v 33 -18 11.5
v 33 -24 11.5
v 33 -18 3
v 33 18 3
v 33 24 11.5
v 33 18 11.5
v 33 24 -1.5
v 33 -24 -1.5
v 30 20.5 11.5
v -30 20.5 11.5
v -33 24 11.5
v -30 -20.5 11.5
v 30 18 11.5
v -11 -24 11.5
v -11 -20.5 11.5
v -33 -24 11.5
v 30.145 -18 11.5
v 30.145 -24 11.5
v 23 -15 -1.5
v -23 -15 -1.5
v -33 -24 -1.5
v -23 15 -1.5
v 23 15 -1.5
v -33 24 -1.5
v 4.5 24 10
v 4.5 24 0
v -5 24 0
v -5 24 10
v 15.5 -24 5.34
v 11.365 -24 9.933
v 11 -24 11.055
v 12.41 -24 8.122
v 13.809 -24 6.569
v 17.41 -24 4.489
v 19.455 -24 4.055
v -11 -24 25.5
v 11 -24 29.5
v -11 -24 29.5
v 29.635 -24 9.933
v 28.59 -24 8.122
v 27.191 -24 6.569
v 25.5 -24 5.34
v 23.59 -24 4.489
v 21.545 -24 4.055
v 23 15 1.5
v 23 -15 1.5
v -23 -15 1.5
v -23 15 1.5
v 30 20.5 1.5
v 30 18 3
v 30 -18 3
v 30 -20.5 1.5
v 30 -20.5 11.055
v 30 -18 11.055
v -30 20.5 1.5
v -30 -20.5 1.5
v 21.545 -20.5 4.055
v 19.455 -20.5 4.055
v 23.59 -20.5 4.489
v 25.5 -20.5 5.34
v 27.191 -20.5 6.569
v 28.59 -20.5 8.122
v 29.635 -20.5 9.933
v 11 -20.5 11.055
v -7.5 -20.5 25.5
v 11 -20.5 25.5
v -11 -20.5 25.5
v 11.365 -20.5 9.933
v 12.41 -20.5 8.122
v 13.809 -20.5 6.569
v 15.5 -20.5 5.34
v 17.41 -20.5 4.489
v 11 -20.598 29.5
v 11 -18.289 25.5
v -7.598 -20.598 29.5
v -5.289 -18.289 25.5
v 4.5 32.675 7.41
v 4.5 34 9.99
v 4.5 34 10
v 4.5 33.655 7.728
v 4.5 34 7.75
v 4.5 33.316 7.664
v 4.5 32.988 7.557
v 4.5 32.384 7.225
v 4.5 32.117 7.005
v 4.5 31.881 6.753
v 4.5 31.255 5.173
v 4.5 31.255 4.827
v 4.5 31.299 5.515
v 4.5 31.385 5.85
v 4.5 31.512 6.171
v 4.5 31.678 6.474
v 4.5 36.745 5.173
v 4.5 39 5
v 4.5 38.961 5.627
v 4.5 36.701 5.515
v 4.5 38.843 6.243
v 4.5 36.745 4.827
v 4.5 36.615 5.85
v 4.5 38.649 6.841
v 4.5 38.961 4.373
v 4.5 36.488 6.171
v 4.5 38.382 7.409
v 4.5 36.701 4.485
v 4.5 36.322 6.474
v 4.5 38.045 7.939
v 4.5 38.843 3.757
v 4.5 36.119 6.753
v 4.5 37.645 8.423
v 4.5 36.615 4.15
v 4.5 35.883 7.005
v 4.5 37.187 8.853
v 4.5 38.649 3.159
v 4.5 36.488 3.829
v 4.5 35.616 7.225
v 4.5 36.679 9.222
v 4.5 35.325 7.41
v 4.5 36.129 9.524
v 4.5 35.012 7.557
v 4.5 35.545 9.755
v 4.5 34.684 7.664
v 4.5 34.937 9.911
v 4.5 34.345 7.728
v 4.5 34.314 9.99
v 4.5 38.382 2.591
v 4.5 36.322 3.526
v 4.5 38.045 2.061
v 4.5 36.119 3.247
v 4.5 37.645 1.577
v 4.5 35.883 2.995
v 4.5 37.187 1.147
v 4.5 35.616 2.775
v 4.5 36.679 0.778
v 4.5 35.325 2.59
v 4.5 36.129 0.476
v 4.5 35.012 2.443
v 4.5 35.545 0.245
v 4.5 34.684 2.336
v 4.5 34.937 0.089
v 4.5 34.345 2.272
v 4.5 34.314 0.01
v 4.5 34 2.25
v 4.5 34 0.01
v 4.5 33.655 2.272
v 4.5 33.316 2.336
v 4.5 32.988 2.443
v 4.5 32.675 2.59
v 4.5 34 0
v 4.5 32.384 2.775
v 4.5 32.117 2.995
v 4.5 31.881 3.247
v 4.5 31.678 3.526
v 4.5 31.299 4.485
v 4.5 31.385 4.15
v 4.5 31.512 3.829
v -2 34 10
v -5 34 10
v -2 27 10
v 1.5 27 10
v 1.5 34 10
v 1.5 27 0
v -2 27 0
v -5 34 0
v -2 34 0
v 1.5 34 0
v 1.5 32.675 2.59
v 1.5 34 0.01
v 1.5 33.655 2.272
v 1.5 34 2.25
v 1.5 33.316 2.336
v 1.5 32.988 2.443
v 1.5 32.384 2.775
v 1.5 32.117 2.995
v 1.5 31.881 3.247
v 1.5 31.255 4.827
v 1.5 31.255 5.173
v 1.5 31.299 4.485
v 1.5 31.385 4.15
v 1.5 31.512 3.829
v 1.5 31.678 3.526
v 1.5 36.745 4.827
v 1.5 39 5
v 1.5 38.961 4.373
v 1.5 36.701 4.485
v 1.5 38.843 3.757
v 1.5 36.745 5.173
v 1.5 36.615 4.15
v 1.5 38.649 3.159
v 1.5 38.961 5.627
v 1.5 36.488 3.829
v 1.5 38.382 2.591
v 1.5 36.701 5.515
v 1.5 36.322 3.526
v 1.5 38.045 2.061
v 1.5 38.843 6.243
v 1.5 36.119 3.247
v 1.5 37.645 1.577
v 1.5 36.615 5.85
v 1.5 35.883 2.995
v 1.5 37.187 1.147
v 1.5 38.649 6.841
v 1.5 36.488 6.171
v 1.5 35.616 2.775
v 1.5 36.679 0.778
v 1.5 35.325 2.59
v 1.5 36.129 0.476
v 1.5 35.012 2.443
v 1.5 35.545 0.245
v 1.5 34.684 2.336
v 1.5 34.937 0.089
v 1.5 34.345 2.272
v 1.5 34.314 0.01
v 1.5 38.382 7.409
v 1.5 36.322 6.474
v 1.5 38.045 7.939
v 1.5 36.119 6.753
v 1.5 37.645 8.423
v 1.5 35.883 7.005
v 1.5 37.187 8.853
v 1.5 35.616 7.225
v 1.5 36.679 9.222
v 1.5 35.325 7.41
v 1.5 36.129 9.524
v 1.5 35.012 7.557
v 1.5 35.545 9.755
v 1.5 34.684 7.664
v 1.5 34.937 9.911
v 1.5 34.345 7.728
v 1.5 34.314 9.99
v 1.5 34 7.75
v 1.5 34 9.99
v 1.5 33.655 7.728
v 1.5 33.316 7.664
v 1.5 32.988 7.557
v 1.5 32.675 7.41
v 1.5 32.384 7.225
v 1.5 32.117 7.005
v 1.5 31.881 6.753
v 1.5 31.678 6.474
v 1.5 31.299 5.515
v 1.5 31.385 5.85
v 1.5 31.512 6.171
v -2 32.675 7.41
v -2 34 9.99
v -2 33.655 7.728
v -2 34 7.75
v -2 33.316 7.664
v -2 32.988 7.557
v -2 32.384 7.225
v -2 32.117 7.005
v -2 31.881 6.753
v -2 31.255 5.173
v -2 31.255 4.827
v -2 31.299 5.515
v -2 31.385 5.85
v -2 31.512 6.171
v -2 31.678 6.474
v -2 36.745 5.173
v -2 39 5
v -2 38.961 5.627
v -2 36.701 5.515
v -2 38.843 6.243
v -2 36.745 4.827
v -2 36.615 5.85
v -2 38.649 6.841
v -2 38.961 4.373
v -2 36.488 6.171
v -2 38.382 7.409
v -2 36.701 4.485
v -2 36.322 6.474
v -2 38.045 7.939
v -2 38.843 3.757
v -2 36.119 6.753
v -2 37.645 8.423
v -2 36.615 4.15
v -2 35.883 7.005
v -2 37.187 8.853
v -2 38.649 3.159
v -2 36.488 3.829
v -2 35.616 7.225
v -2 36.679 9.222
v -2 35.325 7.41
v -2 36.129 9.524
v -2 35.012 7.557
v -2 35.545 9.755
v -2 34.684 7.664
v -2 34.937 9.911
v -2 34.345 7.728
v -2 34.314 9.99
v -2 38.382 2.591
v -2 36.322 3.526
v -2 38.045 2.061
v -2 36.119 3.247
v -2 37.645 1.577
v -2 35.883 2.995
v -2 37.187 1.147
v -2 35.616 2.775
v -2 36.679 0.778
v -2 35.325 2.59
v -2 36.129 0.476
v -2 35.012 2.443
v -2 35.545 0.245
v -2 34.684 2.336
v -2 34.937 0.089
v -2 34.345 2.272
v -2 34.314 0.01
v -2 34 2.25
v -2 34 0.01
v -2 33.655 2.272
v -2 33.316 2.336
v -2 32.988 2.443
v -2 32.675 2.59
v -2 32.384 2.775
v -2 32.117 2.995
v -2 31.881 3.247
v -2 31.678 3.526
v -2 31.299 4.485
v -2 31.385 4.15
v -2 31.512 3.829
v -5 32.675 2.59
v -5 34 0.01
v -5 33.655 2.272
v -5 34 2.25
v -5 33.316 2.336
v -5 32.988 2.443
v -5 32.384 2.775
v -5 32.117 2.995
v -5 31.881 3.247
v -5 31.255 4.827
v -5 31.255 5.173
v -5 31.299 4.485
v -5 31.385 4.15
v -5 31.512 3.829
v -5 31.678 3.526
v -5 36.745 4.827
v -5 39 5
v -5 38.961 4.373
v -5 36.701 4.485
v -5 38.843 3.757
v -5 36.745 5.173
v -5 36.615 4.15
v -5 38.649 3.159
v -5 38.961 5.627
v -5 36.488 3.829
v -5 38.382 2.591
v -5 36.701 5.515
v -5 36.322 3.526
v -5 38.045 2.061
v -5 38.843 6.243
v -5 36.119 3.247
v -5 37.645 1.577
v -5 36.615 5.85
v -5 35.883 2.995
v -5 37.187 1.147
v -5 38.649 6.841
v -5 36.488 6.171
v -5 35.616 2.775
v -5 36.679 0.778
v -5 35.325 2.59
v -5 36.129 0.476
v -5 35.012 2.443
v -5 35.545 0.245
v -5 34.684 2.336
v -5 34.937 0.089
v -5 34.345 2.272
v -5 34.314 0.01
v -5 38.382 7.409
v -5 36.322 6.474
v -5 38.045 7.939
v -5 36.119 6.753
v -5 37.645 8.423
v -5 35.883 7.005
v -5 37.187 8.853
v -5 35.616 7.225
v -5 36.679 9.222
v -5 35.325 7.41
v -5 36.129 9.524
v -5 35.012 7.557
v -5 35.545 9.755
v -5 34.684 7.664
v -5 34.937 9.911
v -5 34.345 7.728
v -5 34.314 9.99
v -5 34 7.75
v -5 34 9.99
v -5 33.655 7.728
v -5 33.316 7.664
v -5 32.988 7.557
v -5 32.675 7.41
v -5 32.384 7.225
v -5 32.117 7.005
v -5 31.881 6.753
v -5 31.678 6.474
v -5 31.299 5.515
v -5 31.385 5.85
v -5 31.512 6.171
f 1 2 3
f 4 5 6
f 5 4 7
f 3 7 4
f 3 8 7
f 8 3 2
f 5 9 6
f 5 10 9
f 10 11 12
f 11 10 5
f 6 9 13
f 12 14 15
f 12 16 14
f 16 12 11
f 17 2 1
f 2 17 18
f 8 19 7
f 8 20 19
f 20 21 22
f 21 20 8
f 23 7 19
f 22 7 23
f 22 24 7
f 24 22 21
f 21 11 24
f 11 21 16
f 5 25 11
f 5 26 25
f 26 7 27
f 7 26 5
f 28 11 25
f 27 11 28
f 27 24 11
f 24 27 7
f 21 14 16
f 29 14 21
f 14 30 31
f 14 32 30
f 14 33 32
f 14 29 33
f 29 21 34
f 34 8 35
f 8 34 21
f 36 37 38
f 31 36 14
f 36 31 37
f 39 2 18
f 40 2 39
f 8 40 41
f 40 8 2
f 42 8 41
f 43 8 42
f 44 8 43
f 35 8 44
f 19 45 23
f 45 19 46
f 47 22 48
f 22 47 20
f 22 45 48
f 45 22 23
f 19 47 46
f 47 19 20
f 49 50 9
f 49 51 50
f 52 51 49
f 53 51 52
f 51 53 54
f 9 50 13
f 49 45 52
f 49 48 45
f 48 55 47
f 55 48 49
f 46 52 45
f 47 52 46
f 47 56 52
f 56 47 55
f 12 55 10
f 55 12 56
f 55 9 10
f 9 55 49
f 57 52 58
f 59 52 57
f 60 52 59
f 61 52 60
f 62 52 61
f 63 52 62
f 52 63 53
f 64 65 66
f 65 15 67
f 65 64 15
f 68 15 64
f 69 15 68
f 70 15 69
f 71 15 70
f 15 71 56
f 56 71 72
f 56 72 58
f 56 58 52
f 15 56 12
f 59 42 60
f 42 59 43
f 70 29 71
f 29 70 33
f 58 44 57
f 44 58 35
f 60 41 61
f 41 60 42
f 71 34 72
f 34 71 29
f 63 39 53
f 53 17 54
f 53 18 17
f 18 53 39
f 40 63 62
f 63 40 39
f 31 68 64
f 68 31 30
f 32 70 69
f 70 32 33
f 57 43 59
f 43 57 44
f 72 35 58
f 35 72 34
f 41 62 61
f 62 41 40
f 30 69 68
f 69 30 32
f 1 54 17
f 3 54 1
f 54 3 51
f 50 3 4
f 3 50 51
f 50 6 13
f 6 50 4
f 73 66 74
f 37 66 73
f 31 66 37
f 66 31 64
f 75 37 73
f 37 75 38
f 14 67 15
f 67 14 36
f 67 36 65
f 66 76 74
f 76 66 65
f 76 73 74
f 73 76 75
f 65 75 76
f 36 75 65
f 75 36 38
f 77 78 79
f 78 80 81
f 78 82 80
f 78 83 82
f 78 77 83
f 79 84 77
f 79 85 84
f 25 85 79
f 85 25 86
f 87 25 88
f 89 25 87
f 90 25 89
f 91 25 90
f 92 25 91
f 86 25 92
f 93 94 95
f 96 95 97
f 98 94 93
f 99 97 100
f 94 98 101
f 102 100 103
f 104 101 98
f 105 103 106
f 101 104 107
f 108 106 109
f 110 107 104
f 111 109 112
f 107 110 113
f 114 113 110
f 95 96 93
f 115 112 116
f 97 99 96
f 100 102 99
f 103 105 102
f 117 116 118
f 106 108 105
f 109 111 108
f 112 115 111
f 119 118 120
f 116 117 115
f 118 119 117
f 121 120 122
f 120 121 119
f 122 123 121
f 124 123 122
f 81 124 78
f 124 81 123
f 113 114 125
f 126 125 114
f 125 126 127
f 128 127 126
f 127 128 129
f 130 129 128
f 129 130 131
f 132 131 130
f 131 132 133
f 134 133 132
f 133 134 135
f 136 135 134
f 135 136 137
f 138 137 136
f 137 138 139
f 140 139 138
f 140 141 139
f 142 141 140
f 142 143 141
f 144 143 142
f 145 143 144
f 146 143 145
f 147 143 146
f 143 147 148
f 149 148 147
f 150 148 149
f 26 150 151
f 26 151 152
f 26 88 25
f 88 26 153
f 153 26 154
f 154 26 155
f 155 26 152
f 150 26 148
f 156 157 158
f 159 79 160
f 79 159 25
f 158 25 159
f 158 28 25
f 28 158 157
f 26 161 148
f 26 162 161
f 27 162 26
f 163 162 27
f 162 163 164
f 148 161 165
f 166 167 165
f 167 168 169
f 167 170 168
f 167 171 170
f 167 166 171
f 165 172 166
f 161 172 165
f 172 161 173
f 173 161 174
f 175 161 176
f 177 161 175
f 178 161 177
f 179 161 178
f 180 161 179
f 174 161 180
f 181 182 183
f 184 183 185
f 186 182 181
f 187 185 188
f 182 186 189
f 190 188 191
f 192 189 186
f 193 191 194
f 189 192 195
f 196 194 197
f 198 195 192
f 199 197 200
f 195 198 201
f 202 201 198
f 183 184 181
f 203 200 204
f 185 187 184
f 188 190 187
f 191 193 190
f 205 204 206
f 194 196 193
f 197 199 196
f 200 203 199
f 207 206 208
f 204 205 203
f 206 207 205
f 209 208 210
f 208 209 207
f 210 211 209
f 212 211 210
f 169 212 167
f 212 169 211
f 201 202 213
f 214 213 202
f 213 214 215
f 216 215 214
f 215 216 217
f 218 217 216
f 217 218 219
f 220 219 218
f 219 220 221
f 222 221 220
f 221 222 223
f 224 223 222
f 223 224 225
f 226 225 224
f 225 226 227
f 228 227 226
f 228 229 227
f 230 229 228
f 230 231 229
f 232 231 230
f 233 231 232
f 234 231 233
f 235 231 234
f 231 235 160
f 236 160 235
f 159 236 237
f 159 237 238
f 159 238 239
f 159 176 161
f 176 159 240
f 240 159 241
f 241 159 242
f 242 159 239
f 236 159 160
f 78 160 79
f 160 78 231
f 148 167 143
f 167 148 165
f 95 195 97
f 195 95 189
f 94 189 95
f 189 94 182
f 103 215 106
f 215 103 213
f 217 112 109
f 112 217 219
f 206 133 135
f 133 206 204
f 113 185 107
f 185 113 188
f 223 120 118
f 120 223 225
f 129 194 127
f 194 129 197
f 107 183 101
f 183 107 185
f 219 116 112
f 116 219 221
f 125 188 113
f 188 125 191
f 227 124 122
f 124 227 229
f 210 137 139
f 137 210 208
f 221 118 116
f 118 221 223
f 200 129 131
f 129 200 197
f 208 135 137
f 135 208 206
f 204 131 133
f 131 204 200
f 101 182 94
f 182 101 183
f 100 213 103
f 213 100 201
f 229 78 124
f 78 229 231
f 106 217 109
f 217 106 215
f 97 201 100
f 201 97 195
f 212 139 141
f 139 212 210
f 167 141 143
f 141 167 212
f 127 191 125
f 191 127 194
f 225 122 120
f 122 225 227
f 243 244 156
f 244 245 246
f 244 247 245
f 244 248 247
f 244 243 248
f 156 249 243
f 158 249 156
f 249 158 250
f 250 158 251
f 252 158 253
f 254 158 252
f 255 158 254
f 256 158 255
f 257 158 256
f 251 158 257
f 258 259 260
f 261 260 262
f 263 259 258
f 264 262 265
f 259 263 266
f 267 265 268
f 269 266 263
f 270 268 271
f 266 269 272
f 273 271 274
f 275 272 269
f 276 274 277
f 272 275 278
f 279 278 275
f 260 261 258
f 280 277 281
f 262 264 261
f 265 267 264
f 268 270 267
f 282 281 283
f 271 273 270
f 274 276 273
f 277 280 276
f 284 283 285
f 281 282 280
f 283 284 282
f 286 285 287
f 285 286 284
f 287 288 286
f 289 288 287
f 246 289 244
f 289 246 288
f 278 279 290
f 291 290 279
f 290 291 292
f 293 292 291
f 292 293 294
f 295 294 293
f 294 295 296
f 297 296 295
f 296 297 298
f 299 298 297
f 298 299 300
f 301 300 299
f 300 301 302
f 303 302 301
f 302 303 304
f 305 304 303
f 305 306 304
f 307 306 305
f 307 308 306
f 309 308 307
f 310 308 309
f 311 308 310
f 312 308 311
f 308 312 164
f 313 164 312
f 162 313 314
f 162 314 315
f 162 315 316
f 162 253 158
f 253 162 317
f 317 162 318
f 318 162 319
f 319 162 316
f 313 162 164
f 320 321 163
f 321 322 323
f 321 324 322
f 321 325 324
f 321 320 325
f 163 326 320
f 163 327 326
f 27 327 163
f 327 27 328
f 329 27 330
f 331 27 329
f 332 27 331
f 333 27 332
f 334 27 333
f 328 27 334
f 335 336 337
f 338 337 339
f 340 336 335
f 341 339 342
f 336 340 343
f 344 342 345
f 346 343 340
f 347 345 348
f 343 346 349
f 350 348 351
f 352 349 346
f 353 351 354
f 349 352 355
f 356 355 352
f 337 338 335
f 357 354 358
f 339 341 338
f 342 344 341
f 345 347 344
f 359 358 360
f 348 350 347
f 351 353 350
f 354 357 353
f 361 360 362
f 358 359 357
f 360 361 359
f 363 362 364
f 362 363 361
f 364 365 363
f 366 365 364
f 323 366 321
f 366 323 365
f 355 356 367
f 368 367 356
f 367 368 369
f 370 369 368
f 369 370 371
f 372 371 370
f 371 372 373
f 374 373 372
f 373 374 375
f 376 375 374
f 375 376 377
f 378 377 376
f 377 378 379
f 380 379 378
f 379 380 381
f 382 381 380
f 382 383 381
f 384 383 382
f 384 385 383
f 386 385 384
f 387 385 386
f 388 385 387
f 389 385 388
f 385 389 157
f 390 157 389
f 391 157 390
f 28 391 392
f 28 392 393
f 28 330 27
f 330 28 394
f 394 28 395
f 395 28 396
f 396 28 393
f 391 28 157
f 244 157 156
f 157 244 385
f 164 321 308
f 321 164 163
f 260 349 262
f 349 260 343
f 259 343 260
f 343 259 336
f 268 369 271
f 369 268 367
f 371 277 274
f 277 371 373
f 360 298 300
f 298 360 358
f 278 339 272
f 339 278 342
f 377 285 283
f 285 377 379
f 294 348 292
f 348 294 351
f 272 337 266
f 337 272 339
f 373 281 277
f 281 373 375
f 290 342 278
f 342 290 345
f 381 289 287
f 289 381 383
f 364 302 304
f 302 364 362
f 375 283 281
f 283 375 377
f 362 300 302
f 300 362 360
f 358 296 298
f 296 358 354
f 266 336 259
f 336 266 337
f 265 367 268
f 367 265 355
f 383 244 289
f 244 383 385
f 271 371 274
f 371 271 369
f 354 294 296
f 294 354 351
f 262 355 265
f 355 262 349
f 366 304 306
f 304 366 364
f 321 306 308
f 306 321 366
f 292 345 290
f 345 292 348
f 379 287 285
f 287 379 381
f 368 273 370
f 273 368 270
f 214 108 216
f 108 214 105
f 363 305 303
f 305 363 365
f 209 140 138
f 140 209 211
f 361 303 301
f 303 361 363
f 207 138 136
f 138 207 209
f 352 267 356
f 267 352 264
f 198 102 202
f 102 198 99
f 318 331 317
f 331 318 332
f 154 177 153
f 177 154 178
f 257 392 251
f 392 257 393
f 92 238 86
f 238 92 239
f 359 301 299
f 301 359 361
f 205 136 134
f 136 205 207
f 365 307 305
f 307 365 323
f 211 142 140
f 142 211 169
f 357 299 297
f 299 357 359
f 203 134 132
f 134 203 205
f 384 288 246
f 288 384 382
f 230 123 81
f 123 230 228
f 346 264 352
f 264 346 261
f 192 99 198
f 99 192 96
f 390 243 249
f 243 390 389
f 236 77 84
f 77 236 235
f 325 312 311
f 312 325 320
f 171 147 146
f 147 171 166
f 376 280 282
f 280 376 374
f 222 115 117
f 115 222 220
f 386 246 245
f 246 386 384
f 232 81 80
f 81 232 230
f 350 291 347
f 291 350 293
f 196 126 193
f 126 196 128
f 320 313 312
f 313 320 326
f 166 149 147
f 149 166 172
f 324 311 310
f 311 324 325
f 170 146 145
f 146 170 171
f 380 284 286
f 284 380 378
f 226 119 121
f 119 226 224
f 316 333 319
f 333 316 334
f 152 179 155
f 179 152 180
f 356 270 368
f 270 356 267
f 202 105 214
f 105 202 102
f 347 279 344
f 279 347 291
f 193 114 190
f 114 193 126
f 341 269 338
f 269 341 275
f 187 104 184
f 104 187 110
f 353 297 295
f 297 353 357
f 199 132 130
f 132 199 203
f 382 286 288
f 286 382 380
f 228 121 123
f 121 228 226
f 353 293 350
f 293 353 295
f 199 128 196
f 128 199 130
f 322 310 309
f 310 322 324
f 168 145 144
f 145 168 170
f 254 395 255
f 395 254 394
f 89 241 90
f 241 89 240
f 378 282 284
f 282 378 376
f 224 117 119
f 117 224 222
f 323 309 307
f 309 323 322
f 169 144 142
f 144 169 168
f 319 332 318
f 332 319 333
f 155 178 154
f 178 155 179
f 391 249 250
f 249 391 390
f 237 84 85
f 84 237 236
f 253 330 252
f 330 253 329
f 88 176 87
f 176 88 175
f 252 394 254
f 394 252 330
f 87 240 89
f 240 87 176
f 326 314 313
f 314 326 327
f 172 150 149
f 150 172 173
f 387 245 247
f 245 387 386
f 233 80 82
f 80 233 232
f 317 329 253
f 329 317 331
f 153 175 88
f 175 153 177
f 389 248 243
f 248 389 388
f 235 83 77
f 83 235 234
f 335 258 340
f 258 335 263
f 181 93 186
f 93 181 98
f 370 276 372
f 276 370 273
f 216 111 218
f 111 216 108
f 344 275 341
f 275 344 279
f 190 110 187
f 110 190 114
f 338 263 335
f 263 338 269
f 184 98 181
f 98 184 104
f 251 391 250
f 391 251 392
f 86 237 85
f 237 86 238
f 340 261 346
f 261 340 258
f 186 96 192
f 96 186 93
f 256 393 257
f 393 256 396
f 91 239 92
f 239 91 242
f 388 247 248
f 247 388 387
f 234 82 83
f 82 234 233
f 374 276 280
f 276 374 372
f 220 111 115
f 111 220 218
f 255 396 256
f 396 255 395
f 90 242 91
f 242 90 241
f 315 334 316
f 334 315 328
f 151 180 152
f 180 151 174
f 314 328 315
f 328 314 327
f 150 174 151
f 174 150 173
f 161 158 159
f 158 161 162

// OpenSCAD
//DBPower-4K//
//action-cam mount//
//camera case//
translate([0, 0, 5,])
difference(){
difference(){
cube([66, 48, 13, ], center=true );
cube([46, 30, 13, ], center=true );
}
translate([0, 0, 3,])
cube([60, 41, 13, ], center=true );
//shutter button//
 translate([20.5, -18, 9,])
rotate([90, 0, 0]) {   
   cylinder(h=11, d=20, $fn=30 );}
   //side buttons//
   translate([33, 0, 3,])
cube([10, 36, 10, ], center=true );
}

//hold in clip//
difference(){
translate([0, -21, 20,])
difference(){
cube([22, 6, 19, ], center=true );
    translate([0, 2, -2,])
cube([22, 3, 15, ], center=true );
    
} 

translate([-11, -18, 28,])
rotate([0, 90, 0]) {   
   cylinder(h=22, d=6, $fn=3 );}
   
    translate([-11, -16, 25.5,]) 
  rotate([0, 0, 0]) { 
    cylinder(h=5, d=16, $fn=4 );}
}


//module borrowed from thingiverse//
$fn = 50;

// 5.5 diameter
bolt_hole_r = 5.5 / 2;

module GoPro_Connection()
{
	translate([-5, 24, 0,])
	{
		difference()
		{
			// tabs
			union()
			{
                //tab1//
				cube([3,10,10]);
				translate([0,10,5]) rotate([90,0,90]) cylinder(3,5,5);
		
				// note: center tab is slightly larger the the other two tabs
				translate([6.5,0,0])
				{
					cube([3.0,10,10]);
					translate([0,10,5]) rotate([90,0,90]) cylinder(3.0,5,5);
				}

				//translate([12.8,0,0])
			//	{
			//		cube([3,10,10]);
			//		translate([0,10,5]) rotate([90,0,90]) cylinder(3,5,5);
	//			}
			}

			// bolt hole
			translate([-7, 10, 5]) rotate([0,90,0]) cylinder(30, bolt_hole_r, bolt_hole_r);
		}
	}

	// connection block
    translate([-5, 24, 0,])
	cube([9.5,3,10]);
}

GoPro_Connection();
